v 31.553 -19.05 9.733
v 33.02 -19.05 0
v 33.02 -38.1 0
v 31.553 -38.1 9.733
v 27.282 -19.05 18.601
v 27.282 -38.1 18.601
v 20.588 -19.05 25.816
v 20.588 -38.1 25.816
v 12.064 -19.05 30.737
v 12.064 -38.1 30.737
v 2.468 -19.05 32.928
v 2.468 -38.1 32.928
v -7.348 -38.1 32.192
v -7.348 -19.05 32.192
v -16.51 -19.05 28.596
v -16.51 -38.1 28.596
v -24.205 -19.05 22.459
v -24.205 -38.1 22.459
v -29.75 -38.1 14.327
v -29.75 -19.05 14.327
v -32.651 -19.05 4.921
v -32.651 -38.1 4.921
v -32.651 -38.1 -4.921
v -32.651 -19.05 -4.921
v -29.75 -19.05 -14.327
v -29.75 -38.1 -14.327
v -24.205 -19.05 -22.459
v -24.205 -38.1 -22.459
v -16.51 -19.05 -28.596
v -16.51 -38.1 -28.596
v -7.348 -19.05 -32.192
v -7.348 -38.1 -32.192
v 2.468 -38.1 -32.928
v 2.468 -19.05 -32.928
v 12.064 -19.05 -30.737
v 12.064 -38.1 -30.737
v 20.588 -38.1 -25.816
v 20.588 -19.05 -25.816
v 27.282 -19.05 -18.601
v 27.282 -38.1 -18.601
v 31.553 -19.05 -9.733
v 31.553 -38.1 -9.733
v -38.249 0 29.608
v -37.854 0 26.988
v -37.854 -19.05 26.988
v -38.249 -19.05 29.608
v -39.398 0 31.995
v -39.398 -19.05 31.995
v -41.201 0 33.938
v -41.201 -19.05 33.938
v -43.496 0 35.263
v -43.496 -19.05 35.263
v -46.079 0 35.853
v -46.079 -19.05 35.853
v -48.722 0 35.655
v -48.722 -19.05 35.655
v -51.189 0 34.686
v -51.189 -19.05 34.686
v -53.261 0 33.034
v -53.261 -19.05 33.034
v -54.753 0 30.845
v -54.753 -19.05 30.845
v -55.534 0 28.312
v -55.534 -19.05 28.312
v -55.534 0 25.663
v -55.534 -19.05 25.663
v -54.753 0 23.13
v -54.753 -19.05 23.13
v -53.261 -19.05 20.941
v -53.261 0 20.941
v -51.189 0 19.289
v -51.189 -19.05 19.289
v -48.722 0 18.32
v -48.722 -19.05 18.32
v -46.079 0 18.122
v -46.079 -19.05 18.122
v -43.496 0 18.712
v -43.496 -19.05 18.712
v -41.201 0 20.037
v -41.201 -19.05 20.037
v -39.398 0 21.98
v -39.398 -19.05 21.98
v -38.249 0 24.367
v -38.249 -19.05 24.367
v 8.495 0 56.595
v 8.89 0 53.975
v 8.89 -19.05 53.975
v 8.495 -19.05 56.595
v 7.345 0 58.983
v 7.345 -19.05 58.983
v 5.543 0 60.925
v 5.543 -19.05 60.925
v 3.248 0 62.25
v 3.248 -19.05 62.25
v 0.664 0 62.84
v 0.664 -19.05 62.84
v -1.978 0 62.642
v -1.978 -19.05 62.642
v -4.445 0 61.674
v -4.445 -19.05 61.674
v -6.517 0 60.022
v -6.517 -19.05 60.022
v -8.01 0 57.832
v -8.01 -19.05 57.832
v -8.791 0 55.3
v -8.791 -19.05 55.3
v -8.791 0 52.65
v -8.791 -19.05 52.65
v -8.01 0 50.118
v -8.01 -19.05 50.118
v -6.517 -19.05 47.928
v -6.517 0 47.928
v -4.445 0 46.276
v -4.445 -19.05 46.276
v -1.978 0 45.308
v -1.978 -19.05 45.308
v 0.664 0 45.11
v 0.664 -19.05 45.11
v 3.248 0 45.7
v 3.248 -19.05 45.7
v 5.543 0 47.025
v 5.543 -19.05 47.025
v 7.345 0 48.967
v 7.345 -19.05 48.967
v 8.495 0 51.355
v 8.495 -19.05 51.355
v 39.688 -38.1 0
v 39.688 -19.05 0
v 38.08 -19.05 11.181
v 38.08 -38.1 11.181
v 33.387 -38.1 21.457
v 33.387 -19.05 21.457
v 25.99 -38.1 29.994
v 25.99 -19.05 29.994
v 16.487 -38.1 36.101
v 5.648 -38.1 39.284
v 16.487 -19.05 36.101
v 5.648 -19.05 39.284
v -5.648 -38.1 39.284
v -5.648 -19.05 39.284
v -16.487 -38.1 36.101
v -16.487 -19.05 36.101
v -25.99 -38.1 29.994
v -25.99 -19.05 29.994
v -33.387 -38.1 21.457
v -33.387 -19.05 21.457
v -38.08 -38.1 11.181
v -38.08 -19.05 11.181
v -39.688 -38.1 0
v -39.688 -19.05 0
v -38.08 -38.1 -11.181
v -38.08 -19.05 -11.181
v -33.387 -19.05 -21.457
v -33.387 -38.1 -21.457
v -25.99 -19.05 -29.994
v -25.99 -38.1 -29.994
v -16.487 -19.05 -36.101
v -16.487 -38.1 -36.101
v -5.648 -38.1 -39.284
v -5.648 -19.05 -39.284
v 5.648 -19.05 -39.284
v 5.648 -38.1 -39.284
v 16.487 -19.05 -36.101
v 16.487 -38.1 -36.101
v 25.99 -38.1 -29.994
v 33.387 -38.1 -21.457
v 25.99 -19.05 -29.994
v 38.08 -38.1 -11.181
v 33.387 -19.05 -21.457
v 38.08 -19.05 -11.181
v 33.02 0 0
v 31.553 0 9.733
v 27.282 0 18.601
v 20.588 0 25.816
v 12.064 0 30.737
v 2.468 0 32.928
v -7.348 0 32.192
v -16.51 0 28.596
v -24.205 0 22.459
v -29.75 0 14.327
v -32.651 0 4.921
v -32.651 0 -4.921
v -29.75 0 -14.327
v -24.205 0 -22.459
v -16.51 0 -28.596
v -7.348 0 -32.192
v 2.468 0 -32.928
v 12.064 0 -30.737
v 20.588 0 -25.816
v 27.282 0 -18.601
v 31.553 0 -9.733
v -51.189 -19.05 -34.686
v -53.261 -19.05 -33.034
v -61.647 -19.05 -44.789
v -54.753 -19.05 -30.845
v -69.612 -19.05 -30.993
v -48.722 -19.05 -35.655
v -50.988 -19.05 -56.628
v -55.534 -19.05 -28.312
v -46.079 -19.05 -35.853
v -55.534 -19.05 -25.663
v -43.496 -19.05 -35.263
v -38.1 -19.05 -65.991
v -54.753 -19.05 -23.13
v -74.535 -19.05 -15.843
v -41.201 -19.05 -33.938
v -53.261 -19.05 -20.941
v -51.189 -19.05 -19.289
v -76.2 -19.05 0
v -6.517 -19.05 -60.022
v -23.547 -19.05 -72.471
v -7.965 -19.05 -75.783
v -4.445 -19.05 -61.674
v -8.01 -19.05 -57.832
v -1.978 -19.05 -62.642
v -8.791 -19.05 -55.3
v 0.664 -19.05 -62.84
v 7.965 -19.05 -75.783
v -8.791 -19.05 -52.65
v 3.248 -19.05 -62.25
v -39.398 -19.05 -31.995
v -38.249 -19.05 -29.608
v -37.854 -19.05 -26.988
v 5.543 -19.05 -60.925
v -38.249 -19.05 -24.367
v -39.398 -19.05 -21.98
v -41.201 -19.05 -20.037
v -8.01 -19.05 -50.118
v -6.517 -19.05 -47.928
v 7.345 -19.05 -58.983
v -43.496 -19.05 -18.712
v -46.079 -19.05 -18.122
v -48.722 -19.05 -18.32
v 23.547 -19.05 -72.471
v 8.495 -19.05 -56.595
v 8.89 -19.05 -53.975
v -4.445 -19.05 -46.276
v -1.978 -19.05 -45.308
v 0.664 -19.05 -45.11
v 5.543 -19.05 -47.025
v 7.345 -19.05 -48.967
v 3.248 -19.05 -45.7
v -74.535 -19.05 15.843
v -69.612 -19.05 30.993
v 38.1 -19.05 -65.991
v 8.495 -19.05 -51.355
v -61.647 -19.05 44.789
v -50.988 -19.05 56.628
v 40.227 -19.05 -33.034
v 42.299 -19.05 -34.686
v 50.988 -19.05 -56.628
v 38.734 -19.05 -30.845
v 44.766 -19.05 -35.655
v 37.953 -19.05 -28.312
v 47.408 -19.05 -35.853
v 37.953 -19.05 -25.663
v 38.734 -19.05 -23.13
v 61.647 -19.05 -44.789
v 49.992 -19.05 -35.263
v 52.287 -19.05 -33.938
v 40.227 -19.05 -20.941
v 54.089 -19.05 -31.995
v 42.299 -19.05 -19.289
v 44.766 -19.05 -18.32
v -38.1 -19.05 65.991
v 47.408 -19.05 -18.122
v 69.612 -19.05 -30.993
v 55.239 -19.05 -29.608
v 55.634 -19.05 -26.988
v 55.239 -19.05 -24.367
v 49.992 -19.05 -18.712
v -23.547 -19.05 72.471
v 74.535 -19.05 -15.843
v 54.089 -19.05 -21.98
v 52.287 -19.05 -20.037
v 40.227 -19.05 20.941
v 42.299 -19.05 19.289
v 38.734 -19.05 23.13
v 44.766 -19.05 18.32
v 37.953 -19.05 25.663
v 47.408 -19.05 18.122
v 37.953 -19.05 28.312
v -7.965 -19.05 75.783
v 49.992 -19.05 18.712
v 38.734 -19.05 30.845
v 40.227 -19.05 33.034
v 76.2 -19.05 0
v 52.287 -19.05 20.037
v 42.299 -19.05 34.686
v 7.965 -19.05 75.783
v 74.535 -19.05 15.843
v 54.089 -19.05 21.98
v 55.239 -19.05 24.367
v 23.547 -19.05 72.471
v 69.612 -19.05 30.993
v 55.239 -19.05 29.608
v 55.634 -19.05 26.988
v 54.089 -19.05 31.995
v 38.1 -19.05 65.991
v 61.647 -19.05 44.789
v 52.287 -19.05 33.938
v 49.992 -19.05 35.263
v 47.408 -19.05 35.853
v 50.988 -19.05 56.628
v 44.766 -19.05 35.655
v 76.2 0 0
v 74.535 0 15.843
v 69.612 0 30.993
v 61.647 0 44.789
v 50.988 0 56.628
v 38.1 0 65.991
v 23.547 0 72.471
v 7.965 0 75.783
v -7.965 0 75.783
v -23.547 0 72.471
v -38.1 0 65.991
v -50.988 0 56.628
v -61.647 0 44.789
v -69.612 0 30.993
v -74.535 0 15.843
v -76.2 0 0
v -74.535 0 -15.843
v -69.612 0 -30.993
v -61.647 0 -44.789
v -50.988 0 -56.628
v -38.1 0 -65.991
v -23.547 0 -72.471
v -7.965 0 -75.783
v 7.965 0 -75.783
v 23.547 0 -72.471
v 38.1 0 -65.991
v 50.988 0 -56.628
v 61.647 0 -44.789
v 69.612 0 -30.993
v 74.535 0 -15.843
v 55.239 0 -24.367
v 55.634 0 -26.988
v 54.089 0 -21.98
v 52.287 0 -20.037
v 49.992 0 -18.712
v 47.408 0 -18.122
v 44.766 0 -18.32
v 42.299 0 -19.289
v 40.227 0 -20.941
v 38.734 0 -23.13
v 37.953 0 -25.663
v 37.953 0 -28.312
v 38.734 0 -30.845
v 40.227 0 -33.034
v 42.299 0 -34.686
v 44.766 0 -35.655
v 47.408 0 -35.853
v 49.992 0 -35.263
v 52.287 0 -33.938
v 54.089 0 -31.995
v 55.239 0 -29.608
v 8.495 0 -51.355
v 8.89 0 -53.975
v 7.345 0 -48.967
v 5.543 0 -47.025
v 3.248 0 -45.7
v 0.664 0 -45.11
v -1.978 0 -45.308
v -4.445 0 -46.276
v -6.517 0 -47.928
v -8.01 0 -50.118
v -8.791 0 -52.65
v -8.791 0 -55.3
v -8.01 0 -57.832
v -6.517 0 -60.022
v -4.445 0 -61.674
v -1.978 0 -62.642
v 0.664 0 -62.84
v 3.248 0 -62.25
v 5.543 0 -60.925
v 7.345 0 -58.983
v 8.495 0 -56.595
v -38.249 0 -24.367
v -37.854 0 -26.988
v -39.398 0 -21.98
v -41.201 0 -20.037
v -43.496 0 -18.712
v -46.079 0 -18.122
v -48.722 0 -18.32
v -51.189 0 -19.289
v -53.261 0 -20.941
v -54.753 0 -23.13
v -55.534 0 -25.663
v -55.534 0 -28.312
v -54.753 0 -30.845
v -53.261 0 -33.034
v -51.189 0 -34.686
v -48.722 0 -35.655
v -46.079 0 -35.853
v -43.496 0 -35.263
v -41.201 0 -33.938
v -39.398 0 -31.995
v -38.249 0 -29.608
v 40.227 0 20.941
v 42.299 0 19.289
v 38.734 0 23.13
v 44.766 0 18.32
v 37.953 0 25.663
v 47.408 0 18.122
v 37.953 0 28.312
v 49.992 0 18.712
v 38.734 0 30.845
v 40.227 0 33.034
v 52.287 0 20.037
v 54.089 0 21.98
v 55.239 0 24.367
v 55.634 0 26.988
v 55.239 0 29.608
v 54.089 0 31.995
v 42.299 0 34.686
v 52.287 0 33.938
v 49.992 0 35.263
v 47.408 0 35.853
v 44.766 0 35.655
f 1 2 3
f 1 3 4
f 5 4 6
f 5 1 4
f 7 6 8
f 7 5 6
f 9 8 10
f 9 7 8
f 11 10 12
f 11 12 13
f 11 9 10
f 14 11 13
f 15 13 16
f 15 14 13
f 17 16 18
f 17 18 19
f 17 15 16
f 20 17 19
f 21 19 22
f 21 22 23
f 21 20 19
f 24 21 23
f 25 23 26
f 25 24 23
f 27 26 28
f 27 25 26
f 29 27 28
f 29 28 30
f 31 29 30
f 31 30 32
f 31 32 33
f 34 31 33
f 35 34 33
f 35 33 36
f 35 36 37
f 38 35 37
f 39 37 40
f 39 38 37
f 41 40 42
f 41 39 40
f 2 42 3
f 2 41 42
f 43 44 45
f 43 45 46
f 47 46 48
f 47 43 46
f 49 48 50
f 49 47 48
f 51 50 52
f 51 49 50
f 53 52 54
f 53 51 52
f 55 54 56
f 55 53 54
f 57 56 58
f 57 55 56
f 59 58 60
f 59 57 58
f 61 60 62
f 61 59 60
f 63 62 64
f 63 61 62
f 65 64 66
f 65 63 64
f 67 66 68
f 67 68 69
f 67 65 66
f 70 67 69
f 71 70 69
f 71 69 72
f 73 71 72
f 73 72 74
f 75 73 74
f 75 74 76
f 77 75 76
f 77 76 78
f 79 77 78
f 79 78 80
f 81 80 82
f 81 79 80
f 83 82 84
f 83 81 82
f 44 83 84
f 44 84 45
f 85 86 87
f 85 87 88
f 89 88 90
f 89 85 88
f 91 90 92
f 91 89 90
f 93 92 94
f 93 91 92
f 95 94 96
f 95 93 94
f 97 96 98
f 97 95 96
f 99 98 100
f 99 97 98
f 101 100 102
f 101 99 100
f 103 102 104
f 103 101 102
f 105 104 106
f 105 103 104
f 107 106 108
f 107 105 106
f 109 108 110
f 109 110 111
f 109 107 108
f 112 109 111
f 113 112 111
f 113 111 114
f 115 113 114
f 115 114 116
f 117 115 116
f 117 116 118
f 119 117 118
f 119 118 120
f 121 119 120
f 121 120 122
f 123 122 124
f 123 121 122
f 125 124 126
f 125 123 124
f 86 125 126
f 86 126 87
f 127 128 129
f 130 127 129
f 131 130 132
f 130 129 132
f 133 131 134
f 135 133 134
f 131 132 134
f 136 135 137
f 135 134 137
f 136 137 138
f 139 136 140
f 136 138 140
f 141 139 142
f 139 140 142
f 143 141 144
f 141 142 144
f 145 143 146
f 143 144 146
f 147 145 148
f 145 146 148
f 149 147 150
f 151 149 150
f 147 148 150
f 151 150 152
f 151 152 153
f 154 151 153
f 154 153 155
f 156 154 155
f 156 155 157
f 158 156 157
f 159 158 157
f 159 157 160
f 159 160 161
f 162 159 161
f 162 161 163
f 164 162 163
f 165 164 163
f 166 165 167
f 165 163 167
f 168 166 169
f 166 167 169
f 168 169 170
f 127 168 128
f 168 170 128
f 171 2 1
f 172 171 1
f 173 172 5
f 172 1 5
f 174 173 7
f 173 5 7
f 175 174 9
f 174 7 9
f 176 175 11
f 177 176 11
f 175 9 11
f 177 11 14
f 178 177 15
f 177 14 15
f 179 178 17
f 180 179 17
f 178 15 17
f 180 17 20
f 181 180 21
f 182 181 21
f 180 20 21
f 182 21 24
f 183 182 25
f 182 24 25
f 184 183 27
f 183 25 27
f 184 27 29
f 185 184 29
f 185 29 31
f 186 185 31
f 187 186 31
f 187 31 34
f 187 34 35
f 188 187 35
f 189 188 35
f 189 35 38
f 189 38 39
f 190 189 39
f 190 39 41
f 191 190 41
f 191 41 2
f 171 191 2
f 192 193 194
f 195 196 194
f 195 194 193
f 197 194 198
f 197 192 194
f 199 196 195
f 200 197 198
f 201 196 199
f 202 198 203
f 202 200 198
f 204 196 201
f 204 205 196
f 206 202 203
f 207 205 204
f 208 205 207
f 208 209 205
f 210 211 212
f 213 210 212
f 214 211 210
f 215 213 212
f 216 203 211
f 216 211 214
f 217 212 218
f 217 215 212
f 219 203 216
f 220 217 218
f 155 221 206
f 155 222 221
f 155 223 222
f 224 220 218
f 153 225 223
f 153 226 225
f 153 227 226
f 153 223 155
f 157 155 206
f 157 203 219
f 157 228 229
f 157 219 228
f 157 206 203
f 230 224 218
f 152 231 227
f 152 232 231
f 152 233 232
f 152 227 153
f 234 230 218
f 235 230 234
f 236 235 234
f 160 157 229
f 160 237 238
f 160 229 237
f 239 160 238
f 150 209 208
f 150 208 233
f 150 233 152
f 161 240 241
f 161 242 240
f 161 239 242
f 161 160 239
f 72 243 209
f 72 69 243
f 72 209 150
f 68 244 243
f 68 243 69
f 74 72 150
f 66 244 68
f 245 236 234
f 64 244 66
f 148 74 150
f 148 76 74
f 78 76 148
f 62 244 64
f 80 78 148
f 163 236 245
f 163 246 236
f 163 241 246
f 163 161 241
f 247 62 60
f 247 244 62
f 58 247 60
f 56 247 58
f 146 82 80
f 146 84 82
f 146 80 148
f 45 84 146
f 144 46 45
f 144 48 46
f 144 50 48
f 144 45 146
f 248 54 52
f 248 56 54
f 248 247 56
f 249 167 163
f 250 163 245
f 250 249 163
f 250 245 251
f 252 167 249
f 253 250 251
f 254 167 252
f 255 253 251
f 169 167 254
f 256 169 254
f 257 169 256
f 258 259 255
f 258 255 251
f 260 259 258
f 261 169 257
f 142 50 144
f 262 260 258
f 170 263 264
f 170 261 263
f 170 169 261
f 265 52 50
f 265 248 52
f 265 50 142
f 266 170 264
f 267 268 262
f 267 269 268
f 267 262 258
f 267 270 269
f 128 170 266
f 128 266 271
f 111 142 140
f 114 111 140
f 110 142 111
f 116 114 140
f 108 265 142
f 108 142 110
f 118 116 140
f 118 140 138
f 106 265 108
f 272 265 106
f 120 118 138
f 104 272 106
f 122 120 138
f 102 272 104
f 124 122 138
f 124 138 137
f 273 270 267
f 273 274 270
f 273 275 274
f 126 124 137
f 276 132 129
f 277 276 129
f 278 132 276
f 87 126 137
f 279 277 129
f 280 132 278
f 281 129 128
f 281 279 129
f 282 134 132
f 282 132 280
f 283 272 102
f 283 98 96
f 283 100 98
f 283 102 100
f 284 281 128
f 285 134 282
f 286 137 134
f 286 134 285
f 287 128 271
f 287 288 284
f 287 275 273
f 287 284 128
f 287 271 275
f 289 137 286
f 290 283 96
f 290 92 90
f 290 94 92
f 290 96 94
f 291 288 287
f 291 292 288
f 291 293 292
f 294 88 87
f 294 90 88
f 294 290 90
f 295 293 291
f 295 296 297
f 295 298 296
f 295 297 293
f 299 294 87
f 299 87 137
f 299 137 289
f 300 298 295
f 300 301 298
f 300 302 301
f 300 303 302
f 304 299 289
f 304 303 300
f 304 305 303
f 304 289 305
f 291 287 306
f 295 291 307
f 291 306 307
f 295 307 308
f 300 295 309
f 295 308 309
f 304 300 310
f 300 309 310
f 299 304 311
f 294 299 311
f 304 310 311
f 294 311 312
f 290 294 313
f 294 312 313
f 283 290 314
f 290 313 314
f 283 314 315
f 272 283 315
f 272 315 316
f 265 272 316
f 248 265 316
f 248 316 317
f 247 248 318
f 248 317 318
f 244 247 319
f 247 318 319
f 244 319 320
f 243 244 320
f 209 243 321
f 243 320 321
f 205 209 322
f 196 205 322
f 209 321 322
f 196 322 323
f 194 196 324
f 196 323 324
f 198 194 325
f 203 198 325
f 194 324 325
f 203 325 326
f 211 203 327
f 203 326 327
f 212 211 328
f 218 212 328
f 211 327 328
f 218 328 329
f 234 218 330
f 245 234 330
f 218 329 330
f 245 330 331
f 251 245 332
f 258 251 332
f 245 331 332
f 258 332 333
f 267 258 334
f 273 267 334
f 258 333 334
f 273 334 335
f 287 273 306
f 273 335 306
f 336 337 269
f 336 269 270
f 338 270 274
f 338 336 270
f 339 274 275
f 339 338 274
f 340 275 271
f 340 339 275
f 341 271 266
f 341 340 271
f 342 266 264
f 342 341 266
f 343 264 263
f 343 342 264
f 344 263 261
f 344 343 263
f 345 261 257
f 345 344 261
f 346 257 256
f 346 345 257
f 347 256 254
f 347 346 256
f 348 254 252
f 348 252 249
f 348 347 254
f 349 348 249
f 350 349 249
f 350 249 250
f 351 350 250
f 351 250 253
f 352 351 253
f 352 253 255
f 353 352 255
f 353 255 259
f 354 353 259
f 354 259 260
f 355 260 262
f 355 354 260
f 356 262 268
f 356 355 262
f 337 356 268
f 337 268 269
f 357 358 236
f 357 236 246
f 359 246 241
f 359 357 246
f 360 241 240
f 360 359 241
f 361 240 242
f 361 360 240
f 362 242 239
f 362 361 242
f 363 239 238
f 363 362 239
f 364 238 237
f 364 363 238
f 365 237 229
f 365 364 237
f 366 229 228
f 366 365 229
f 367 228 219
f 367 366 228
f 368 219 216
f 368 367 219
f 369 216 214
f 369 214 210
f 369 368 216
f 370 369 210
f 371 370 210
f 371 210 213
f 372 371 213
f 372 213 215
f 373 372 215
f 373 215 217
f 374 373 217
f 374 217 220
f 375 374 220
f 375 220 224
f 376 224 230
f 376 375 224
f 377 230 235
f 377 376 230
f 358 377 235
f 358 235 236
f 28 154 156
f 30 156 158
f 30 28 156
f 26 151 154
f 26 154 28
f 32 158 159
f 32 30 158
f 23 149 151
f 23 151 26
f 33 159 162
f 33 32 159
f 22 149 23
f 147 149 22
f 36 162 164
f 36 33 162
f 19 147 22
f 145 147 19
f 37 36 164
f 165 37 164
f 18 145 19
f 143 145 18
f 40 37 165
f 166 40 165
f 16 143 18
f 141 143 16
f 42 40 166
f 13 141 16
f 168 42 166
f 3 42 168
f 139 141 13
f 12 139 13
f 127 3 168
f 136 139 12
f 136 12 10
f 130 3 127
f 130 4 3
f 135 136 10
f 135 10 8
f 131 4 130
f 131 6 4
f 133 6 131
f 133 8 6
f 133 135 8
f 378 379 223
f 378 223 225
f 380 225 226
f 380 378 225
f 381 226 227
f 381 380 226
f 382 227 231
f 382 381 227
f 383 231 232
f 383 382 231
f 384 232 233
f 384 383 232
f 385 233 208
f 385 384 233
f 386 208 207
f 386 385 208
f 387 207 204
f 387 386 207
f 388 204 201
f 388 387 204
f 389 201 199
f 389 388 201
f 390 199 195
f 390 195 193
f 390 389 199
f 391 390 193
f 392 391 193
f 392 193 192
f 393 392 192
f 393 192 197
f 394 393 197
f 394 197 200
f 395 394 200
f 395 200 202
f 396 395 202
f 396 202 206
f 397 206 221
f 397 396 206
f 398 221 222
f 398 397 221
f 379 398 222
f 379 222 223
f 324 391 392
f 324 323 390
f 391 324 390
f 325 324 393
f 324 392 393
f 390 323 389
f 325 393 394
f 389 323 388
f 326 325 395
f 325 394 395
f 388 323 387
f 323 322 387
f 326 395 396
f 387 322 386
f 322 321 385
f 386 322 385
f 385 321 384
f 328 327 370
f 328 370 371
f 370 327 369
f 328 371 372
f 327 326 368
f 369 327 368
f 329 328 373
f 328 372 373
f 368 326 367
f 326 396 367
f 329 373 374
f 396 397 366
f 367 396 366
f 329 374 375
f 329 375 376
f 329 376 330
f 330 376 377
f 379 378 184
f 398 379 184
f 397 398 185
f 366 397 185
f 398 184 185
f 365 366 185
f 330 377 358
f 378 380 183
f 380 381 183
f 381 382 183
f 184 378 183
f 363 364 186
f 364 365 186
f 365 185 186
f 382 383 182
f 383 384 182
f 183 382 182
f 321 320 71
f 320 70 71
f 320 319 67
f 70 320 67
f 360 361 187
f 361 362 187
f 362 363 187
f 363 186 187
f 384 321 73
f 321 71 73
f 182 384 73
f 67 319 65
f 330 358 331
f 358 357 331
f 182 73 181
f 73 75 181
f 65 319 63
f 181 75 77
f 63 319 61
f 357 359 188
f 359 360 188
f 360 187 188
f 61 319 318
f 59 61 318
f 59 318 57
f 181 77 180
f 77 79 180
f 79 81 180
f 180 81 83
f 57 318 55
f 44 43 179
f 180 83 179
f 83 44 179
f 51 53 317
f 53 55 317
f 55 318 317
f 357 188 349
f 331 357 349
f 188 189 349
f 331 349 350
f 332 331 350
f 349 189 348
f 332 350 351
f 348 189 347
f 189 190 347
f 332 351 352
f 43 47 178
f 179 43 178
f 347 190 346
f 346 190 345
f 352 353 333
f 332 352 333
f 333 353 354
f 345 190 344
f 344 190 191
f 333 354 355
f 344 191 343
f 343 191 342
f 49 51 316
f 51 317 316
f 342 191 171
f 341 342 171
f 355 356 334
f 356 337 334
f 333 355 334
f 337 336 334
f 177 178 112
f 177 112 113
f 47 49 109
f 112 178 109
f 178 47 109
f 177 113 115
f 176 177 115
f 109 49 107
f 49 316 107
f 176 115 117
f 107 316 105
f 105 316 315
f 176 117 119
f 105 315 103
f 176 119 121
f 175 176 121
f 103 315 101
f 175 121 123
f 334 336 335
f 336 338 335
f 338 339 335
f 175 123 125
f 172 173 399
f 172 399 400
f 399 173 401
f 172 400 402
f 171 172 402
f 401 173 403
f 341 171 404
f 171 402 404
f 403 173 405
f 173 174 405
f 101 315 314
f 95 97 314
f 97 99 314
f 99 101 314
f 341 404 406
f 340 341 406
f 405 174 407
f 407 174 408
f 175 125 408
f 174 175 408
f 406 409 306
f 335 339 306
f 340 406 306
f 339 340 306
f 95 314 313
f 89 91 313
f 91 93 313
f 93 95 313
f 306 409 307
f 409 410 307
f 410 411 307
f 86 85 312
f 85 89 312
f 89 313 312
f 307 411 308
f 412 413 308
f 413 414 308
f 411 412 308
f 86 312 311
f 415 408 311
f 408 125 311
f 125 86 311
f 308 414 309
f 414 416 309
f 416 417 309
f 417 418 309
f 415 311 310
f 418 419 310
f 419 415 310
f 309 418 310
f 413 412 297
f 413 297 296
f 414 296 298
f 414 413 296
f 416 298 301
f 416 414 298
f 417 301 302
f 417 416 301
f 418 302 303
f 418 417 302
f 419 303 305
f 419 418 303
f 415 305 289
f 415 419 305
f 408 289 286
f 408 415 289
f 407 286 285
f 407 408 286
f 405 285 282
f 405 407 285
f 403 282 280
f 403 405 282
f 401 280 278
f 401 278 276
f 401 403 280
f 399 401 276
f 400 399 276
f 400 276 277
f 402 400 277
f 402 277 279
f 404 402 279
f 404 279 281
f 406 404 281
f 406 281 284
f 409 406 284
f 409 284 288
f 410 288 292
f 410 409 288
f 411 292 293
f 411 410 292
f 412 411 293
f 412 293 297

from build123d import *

# Parameters (mm, degrees)
F0_R     = 76.2
F0_R_2   = 8.89
F1_DEPTH = 19.05
F2_R     = 39.6875
F2_R_2   = 33.02
F3_DEPTH = 19.05
F4_R     = 33.02
F5_DEPTH = 25.4


with BuildPart() as f1:
    # F0 (on Front) → F1 (new body)
    with BuildSketch(Plane.XZ):
        Circle(F0_R)
        with Locations((-46.743721, -26.9875)):
            Circle(F0_R_2, mode=Mode.SUBTRACT)
        with Locations((0, -53.975)):
            Circle(F0_R_2, mode=Mode.SUBTRACT)
        with Locations((46.743721, -26.9875)):
            Circle(F0_R_2, mode=Mode.SUBTRACT)
        with Locations((-46.743721, 26.9875)):
            Circle(F0_R_2, mode=Mode.SUBTRACT)
        with Locations((46.743721, 26.9875)):
            Circle(F0_R_2, mode=Mode.SUBTRACT)
        with Locations((0, 53.975)):
            Circle(F0_R_2, mode=Mode.SUBTRACT)
    extrude(amount=F1_DEPTH)

    # F2 (on face) → F3 (join)
    with BuildSketch(Plane.XZ.offset(19.05)):
        Circle(F2_R)
        Circle(F2_R_2, mode=Mode.SUBTRACT)
    extrude(amount=F3_DEPTH)

    # F4 (on face) → F5 (cut)
    with BuildSketch(Plane.XZ.offset(19.05)):
        Circle(F4_R)
    extrude(amount=-F5_DEPTH, mode=Mode.SUBTRACT)


solid = f1.part
